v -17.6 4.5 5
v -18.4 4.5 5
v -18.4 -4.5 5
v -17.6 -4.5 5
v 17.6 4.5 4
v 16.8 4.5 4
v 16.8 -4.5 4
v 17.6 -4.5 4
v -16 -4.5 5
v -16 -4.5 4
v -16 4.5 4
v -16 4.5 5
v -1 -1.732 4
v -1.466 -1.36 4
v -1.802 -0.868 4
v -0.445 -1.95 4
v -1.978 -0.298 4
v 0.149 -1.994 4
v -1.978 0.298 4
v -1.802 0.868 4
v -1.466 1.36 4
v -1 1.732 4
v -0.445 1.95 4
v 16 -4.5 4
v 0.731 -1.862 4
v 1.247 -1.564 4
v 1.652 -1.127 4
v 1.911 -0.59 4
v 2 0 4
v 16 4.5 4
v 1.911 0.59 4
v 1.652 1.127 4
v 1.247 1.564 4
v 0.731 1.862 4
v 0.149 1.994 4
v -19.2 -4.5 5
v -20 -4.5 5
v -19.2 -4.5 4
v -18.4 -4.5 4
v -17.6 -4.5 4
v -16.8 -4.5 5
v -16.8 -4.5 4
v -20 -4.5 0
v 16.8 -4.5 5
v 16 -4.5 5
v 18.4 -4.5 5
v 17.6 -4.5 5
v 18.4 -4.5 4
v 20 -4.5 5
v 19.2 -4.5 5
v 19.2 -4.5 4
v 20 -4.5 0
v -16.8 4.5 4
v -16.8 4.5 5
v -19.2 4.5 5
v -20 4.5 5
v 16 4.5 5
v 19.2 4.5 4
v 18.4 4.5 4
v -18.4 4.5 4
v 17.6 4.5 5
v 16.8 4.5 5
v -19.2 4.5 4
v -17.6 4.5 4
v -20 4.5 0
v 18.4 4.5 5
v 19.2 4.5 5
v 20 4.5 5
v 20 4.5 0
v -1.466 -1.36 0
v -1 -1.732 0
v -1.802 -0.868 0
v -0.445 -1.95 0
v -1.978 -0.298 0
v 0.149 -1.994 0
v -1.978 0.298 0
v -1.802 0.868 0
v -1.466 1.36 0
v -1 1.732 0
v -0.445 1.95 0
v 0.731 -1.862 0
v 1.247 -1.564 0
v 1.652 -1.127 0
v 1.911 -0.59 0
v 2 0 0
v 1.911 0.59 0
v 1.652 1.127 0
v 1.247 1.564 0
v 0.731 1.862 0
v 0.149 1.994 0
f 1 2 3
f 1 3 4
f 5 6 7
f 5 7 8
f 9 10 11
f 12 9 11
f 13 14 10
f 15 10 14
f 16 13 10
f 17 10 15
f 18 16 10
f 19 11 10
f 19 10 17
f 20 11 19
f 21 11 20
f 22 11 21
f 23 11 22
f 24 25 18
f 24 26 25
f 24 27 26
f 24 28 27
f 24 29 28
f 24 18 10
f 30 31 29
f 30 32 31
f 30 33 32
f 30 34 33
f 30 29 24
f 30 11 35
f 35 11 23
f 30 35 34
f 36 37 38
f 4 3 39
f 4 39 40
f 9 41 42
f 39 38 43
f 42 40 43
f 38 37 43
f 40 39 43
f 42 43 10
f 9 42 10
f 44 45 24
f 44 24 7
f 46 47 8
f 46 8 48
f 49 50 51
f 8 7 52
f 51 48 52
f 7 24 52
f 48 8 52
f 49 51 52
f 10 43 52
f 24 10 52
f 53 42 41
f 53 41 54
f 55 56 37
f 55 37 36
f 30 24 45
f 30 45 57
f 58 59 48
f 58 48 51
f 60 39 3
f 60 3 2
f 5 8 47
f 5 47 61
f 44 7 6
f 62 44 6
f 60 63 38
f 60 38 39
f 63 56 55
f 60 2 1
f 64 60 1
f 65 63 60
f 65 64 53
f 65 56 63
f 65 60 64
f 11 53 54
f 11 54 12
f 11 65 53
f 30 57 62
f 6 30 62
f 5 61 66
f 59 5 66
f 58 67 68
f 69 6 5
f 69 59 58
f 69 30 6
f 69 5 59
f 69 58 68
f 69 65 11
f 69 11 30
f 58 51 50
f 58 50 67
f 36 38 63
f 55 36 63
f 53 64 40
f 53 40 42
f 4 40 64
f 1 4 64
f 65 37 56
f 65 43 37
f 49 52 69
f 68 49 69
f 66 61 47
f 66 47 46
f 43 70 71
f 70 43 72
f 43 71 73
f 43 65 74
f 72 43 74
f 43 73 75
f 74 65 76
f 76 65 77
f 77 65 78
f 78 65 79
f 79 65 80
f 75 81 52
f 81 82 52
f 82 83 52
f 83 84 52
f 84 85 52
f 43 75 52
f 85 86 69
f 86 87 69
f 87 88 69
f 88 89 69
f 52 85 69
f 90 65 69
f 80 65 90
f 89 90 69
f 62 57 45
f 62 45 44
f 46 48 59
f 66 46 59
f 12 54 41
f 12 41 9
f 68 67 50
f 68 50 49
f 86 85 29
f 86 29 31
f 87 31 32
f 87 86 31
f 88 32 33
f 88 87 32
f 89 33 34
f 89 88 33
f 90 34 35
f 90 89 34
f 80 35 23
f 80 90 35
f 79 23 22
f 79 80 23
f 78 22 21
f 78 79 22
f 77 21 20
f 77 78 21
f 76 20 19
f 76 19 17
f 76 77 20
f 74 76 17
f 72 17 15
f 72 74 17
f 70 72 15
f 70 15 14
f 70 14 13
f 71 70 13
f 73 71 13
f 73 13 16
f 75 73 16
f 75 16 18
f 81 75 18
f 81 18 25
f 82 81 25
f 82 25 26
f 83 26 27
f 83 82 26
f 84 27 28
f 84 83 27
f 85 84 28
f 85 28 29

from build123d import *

# Parameters (mm, degrees)
SKETCH_1_W      = 40
SKETCH_1_H      = 9
SKETCH_1_R      = 2
EXTRUDE_1_DEPTH = 4
SKETCH_2_W      = 0.8
SKETCH_2_H      = 9
EXTRUDE_2_DEPTH = 1


with BuildPart() as part:
    # 草图1 → 凸台-拉伸1 (new body)
    with BuildSketch(Plane.XY):
        Rectangle(SKETCH_1_W, SKETCH_1_H)
        Circle(SKETCH_1_R, mode=Mode.SUBTRACT)
    extrude(amount=EXTRUDE_1_DEPTH)

    # 草图2 → 凸台-拉伸2 (add)
    with BuildSketch(Plane.XY.offset(4)):
        with Locations((-19.6, 0)):
            Rectangle(SKETCH_2_W, SKETCH_2_H)
        with Locations((-18, 0)):
            Rectangle(SKETCH_2_W, SKETCH_2_H)
        with Locations((-16.4, 0)):
            Rectangle(SKETCH_2_W, SKETCH_2_H)
        with Locations((16.4, 0)):
            Rectangle(SKETCH_2_W, SKETCH_2_H)
        with Locations((18, 0)):
            Rectangle(SKETCH_2_W, SKETCH_2_H)
        with Locations((19.6, 0)):
            Rectangle(SKETCH_2_W, SKETCH_2_H)
    extrude(amount=EXTRUDE_2_DEPTH)


solid = part.part
